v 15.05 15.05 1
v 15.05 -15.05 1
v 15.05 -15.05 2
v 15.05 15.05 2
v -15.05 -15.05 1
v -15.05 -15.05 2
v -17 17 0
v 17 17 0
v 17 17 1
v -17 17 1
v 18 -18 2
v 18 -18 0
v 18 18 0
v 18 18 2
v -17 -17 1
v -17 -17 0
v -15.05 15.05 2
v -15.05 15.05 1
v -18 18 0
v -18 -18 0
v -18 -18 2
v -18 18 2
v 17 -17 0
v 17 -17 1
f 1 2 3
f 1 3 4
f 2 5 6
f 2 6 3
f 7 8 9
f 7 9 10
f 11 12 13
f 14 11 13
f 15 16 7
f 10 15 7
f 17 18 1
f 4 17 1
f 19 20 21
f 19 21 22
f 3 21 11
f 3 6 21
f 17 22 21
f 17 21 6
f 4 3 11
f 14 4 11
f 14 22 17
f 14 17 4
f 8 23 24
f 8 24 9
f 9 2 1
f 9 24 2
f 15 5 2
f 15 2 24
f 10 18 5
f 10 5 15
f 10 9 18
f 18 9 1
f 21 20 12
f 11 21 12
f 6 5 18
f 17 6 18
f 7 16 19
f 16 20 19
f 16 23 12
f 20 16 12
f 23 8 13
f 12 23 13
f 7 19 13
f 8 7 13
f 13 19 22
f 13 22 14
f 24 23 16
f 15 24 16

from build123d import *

# Parameters (mm, degrees)
ESQUISSE1_W             = 36
ESQUISSE1_H             = 36
ESQUISSE1_W_2           = 30.1
ESQUISSE1_H_2           = 30.1
BOSS_EXTRU_1_DEPTH      = 2
ESQUISSE2_W             = 34
ESQUISSE2_H             = 34
ENL_V_MAT_EXTRU_1_DEPTH = 1


with BuildPart() as part:
    # Esquisse1 → Boss.-Extru.1 (new body)
    with BuildSketch(Plane.XY):
        Rectangle(ESQUISSE1_W, ESQUISSE1_H)
        Rectangle(ESQUISSE1_W_2, ESQUISSE1_H_2, mode=Mode.SUBTRACT)
    extrude(amount=BOSS_EXTRU_1_DEPTH)

    # Esquisse2 → Enlèv. mat.-Extru.1 (cut)
    with BuildSketch(Plane(origin=(0, 0, 0), x_dir=(-1, 0, 0), z_dir=(0, 0, -1))):
        Rectangle(ESQUISSE2_W, ESQUISSE2_H)
    extrude(amount=-ENL_V_MAT_EXTRU_1_DEPTH, mode=Mode.SUBTRACT)


solid = part.part
